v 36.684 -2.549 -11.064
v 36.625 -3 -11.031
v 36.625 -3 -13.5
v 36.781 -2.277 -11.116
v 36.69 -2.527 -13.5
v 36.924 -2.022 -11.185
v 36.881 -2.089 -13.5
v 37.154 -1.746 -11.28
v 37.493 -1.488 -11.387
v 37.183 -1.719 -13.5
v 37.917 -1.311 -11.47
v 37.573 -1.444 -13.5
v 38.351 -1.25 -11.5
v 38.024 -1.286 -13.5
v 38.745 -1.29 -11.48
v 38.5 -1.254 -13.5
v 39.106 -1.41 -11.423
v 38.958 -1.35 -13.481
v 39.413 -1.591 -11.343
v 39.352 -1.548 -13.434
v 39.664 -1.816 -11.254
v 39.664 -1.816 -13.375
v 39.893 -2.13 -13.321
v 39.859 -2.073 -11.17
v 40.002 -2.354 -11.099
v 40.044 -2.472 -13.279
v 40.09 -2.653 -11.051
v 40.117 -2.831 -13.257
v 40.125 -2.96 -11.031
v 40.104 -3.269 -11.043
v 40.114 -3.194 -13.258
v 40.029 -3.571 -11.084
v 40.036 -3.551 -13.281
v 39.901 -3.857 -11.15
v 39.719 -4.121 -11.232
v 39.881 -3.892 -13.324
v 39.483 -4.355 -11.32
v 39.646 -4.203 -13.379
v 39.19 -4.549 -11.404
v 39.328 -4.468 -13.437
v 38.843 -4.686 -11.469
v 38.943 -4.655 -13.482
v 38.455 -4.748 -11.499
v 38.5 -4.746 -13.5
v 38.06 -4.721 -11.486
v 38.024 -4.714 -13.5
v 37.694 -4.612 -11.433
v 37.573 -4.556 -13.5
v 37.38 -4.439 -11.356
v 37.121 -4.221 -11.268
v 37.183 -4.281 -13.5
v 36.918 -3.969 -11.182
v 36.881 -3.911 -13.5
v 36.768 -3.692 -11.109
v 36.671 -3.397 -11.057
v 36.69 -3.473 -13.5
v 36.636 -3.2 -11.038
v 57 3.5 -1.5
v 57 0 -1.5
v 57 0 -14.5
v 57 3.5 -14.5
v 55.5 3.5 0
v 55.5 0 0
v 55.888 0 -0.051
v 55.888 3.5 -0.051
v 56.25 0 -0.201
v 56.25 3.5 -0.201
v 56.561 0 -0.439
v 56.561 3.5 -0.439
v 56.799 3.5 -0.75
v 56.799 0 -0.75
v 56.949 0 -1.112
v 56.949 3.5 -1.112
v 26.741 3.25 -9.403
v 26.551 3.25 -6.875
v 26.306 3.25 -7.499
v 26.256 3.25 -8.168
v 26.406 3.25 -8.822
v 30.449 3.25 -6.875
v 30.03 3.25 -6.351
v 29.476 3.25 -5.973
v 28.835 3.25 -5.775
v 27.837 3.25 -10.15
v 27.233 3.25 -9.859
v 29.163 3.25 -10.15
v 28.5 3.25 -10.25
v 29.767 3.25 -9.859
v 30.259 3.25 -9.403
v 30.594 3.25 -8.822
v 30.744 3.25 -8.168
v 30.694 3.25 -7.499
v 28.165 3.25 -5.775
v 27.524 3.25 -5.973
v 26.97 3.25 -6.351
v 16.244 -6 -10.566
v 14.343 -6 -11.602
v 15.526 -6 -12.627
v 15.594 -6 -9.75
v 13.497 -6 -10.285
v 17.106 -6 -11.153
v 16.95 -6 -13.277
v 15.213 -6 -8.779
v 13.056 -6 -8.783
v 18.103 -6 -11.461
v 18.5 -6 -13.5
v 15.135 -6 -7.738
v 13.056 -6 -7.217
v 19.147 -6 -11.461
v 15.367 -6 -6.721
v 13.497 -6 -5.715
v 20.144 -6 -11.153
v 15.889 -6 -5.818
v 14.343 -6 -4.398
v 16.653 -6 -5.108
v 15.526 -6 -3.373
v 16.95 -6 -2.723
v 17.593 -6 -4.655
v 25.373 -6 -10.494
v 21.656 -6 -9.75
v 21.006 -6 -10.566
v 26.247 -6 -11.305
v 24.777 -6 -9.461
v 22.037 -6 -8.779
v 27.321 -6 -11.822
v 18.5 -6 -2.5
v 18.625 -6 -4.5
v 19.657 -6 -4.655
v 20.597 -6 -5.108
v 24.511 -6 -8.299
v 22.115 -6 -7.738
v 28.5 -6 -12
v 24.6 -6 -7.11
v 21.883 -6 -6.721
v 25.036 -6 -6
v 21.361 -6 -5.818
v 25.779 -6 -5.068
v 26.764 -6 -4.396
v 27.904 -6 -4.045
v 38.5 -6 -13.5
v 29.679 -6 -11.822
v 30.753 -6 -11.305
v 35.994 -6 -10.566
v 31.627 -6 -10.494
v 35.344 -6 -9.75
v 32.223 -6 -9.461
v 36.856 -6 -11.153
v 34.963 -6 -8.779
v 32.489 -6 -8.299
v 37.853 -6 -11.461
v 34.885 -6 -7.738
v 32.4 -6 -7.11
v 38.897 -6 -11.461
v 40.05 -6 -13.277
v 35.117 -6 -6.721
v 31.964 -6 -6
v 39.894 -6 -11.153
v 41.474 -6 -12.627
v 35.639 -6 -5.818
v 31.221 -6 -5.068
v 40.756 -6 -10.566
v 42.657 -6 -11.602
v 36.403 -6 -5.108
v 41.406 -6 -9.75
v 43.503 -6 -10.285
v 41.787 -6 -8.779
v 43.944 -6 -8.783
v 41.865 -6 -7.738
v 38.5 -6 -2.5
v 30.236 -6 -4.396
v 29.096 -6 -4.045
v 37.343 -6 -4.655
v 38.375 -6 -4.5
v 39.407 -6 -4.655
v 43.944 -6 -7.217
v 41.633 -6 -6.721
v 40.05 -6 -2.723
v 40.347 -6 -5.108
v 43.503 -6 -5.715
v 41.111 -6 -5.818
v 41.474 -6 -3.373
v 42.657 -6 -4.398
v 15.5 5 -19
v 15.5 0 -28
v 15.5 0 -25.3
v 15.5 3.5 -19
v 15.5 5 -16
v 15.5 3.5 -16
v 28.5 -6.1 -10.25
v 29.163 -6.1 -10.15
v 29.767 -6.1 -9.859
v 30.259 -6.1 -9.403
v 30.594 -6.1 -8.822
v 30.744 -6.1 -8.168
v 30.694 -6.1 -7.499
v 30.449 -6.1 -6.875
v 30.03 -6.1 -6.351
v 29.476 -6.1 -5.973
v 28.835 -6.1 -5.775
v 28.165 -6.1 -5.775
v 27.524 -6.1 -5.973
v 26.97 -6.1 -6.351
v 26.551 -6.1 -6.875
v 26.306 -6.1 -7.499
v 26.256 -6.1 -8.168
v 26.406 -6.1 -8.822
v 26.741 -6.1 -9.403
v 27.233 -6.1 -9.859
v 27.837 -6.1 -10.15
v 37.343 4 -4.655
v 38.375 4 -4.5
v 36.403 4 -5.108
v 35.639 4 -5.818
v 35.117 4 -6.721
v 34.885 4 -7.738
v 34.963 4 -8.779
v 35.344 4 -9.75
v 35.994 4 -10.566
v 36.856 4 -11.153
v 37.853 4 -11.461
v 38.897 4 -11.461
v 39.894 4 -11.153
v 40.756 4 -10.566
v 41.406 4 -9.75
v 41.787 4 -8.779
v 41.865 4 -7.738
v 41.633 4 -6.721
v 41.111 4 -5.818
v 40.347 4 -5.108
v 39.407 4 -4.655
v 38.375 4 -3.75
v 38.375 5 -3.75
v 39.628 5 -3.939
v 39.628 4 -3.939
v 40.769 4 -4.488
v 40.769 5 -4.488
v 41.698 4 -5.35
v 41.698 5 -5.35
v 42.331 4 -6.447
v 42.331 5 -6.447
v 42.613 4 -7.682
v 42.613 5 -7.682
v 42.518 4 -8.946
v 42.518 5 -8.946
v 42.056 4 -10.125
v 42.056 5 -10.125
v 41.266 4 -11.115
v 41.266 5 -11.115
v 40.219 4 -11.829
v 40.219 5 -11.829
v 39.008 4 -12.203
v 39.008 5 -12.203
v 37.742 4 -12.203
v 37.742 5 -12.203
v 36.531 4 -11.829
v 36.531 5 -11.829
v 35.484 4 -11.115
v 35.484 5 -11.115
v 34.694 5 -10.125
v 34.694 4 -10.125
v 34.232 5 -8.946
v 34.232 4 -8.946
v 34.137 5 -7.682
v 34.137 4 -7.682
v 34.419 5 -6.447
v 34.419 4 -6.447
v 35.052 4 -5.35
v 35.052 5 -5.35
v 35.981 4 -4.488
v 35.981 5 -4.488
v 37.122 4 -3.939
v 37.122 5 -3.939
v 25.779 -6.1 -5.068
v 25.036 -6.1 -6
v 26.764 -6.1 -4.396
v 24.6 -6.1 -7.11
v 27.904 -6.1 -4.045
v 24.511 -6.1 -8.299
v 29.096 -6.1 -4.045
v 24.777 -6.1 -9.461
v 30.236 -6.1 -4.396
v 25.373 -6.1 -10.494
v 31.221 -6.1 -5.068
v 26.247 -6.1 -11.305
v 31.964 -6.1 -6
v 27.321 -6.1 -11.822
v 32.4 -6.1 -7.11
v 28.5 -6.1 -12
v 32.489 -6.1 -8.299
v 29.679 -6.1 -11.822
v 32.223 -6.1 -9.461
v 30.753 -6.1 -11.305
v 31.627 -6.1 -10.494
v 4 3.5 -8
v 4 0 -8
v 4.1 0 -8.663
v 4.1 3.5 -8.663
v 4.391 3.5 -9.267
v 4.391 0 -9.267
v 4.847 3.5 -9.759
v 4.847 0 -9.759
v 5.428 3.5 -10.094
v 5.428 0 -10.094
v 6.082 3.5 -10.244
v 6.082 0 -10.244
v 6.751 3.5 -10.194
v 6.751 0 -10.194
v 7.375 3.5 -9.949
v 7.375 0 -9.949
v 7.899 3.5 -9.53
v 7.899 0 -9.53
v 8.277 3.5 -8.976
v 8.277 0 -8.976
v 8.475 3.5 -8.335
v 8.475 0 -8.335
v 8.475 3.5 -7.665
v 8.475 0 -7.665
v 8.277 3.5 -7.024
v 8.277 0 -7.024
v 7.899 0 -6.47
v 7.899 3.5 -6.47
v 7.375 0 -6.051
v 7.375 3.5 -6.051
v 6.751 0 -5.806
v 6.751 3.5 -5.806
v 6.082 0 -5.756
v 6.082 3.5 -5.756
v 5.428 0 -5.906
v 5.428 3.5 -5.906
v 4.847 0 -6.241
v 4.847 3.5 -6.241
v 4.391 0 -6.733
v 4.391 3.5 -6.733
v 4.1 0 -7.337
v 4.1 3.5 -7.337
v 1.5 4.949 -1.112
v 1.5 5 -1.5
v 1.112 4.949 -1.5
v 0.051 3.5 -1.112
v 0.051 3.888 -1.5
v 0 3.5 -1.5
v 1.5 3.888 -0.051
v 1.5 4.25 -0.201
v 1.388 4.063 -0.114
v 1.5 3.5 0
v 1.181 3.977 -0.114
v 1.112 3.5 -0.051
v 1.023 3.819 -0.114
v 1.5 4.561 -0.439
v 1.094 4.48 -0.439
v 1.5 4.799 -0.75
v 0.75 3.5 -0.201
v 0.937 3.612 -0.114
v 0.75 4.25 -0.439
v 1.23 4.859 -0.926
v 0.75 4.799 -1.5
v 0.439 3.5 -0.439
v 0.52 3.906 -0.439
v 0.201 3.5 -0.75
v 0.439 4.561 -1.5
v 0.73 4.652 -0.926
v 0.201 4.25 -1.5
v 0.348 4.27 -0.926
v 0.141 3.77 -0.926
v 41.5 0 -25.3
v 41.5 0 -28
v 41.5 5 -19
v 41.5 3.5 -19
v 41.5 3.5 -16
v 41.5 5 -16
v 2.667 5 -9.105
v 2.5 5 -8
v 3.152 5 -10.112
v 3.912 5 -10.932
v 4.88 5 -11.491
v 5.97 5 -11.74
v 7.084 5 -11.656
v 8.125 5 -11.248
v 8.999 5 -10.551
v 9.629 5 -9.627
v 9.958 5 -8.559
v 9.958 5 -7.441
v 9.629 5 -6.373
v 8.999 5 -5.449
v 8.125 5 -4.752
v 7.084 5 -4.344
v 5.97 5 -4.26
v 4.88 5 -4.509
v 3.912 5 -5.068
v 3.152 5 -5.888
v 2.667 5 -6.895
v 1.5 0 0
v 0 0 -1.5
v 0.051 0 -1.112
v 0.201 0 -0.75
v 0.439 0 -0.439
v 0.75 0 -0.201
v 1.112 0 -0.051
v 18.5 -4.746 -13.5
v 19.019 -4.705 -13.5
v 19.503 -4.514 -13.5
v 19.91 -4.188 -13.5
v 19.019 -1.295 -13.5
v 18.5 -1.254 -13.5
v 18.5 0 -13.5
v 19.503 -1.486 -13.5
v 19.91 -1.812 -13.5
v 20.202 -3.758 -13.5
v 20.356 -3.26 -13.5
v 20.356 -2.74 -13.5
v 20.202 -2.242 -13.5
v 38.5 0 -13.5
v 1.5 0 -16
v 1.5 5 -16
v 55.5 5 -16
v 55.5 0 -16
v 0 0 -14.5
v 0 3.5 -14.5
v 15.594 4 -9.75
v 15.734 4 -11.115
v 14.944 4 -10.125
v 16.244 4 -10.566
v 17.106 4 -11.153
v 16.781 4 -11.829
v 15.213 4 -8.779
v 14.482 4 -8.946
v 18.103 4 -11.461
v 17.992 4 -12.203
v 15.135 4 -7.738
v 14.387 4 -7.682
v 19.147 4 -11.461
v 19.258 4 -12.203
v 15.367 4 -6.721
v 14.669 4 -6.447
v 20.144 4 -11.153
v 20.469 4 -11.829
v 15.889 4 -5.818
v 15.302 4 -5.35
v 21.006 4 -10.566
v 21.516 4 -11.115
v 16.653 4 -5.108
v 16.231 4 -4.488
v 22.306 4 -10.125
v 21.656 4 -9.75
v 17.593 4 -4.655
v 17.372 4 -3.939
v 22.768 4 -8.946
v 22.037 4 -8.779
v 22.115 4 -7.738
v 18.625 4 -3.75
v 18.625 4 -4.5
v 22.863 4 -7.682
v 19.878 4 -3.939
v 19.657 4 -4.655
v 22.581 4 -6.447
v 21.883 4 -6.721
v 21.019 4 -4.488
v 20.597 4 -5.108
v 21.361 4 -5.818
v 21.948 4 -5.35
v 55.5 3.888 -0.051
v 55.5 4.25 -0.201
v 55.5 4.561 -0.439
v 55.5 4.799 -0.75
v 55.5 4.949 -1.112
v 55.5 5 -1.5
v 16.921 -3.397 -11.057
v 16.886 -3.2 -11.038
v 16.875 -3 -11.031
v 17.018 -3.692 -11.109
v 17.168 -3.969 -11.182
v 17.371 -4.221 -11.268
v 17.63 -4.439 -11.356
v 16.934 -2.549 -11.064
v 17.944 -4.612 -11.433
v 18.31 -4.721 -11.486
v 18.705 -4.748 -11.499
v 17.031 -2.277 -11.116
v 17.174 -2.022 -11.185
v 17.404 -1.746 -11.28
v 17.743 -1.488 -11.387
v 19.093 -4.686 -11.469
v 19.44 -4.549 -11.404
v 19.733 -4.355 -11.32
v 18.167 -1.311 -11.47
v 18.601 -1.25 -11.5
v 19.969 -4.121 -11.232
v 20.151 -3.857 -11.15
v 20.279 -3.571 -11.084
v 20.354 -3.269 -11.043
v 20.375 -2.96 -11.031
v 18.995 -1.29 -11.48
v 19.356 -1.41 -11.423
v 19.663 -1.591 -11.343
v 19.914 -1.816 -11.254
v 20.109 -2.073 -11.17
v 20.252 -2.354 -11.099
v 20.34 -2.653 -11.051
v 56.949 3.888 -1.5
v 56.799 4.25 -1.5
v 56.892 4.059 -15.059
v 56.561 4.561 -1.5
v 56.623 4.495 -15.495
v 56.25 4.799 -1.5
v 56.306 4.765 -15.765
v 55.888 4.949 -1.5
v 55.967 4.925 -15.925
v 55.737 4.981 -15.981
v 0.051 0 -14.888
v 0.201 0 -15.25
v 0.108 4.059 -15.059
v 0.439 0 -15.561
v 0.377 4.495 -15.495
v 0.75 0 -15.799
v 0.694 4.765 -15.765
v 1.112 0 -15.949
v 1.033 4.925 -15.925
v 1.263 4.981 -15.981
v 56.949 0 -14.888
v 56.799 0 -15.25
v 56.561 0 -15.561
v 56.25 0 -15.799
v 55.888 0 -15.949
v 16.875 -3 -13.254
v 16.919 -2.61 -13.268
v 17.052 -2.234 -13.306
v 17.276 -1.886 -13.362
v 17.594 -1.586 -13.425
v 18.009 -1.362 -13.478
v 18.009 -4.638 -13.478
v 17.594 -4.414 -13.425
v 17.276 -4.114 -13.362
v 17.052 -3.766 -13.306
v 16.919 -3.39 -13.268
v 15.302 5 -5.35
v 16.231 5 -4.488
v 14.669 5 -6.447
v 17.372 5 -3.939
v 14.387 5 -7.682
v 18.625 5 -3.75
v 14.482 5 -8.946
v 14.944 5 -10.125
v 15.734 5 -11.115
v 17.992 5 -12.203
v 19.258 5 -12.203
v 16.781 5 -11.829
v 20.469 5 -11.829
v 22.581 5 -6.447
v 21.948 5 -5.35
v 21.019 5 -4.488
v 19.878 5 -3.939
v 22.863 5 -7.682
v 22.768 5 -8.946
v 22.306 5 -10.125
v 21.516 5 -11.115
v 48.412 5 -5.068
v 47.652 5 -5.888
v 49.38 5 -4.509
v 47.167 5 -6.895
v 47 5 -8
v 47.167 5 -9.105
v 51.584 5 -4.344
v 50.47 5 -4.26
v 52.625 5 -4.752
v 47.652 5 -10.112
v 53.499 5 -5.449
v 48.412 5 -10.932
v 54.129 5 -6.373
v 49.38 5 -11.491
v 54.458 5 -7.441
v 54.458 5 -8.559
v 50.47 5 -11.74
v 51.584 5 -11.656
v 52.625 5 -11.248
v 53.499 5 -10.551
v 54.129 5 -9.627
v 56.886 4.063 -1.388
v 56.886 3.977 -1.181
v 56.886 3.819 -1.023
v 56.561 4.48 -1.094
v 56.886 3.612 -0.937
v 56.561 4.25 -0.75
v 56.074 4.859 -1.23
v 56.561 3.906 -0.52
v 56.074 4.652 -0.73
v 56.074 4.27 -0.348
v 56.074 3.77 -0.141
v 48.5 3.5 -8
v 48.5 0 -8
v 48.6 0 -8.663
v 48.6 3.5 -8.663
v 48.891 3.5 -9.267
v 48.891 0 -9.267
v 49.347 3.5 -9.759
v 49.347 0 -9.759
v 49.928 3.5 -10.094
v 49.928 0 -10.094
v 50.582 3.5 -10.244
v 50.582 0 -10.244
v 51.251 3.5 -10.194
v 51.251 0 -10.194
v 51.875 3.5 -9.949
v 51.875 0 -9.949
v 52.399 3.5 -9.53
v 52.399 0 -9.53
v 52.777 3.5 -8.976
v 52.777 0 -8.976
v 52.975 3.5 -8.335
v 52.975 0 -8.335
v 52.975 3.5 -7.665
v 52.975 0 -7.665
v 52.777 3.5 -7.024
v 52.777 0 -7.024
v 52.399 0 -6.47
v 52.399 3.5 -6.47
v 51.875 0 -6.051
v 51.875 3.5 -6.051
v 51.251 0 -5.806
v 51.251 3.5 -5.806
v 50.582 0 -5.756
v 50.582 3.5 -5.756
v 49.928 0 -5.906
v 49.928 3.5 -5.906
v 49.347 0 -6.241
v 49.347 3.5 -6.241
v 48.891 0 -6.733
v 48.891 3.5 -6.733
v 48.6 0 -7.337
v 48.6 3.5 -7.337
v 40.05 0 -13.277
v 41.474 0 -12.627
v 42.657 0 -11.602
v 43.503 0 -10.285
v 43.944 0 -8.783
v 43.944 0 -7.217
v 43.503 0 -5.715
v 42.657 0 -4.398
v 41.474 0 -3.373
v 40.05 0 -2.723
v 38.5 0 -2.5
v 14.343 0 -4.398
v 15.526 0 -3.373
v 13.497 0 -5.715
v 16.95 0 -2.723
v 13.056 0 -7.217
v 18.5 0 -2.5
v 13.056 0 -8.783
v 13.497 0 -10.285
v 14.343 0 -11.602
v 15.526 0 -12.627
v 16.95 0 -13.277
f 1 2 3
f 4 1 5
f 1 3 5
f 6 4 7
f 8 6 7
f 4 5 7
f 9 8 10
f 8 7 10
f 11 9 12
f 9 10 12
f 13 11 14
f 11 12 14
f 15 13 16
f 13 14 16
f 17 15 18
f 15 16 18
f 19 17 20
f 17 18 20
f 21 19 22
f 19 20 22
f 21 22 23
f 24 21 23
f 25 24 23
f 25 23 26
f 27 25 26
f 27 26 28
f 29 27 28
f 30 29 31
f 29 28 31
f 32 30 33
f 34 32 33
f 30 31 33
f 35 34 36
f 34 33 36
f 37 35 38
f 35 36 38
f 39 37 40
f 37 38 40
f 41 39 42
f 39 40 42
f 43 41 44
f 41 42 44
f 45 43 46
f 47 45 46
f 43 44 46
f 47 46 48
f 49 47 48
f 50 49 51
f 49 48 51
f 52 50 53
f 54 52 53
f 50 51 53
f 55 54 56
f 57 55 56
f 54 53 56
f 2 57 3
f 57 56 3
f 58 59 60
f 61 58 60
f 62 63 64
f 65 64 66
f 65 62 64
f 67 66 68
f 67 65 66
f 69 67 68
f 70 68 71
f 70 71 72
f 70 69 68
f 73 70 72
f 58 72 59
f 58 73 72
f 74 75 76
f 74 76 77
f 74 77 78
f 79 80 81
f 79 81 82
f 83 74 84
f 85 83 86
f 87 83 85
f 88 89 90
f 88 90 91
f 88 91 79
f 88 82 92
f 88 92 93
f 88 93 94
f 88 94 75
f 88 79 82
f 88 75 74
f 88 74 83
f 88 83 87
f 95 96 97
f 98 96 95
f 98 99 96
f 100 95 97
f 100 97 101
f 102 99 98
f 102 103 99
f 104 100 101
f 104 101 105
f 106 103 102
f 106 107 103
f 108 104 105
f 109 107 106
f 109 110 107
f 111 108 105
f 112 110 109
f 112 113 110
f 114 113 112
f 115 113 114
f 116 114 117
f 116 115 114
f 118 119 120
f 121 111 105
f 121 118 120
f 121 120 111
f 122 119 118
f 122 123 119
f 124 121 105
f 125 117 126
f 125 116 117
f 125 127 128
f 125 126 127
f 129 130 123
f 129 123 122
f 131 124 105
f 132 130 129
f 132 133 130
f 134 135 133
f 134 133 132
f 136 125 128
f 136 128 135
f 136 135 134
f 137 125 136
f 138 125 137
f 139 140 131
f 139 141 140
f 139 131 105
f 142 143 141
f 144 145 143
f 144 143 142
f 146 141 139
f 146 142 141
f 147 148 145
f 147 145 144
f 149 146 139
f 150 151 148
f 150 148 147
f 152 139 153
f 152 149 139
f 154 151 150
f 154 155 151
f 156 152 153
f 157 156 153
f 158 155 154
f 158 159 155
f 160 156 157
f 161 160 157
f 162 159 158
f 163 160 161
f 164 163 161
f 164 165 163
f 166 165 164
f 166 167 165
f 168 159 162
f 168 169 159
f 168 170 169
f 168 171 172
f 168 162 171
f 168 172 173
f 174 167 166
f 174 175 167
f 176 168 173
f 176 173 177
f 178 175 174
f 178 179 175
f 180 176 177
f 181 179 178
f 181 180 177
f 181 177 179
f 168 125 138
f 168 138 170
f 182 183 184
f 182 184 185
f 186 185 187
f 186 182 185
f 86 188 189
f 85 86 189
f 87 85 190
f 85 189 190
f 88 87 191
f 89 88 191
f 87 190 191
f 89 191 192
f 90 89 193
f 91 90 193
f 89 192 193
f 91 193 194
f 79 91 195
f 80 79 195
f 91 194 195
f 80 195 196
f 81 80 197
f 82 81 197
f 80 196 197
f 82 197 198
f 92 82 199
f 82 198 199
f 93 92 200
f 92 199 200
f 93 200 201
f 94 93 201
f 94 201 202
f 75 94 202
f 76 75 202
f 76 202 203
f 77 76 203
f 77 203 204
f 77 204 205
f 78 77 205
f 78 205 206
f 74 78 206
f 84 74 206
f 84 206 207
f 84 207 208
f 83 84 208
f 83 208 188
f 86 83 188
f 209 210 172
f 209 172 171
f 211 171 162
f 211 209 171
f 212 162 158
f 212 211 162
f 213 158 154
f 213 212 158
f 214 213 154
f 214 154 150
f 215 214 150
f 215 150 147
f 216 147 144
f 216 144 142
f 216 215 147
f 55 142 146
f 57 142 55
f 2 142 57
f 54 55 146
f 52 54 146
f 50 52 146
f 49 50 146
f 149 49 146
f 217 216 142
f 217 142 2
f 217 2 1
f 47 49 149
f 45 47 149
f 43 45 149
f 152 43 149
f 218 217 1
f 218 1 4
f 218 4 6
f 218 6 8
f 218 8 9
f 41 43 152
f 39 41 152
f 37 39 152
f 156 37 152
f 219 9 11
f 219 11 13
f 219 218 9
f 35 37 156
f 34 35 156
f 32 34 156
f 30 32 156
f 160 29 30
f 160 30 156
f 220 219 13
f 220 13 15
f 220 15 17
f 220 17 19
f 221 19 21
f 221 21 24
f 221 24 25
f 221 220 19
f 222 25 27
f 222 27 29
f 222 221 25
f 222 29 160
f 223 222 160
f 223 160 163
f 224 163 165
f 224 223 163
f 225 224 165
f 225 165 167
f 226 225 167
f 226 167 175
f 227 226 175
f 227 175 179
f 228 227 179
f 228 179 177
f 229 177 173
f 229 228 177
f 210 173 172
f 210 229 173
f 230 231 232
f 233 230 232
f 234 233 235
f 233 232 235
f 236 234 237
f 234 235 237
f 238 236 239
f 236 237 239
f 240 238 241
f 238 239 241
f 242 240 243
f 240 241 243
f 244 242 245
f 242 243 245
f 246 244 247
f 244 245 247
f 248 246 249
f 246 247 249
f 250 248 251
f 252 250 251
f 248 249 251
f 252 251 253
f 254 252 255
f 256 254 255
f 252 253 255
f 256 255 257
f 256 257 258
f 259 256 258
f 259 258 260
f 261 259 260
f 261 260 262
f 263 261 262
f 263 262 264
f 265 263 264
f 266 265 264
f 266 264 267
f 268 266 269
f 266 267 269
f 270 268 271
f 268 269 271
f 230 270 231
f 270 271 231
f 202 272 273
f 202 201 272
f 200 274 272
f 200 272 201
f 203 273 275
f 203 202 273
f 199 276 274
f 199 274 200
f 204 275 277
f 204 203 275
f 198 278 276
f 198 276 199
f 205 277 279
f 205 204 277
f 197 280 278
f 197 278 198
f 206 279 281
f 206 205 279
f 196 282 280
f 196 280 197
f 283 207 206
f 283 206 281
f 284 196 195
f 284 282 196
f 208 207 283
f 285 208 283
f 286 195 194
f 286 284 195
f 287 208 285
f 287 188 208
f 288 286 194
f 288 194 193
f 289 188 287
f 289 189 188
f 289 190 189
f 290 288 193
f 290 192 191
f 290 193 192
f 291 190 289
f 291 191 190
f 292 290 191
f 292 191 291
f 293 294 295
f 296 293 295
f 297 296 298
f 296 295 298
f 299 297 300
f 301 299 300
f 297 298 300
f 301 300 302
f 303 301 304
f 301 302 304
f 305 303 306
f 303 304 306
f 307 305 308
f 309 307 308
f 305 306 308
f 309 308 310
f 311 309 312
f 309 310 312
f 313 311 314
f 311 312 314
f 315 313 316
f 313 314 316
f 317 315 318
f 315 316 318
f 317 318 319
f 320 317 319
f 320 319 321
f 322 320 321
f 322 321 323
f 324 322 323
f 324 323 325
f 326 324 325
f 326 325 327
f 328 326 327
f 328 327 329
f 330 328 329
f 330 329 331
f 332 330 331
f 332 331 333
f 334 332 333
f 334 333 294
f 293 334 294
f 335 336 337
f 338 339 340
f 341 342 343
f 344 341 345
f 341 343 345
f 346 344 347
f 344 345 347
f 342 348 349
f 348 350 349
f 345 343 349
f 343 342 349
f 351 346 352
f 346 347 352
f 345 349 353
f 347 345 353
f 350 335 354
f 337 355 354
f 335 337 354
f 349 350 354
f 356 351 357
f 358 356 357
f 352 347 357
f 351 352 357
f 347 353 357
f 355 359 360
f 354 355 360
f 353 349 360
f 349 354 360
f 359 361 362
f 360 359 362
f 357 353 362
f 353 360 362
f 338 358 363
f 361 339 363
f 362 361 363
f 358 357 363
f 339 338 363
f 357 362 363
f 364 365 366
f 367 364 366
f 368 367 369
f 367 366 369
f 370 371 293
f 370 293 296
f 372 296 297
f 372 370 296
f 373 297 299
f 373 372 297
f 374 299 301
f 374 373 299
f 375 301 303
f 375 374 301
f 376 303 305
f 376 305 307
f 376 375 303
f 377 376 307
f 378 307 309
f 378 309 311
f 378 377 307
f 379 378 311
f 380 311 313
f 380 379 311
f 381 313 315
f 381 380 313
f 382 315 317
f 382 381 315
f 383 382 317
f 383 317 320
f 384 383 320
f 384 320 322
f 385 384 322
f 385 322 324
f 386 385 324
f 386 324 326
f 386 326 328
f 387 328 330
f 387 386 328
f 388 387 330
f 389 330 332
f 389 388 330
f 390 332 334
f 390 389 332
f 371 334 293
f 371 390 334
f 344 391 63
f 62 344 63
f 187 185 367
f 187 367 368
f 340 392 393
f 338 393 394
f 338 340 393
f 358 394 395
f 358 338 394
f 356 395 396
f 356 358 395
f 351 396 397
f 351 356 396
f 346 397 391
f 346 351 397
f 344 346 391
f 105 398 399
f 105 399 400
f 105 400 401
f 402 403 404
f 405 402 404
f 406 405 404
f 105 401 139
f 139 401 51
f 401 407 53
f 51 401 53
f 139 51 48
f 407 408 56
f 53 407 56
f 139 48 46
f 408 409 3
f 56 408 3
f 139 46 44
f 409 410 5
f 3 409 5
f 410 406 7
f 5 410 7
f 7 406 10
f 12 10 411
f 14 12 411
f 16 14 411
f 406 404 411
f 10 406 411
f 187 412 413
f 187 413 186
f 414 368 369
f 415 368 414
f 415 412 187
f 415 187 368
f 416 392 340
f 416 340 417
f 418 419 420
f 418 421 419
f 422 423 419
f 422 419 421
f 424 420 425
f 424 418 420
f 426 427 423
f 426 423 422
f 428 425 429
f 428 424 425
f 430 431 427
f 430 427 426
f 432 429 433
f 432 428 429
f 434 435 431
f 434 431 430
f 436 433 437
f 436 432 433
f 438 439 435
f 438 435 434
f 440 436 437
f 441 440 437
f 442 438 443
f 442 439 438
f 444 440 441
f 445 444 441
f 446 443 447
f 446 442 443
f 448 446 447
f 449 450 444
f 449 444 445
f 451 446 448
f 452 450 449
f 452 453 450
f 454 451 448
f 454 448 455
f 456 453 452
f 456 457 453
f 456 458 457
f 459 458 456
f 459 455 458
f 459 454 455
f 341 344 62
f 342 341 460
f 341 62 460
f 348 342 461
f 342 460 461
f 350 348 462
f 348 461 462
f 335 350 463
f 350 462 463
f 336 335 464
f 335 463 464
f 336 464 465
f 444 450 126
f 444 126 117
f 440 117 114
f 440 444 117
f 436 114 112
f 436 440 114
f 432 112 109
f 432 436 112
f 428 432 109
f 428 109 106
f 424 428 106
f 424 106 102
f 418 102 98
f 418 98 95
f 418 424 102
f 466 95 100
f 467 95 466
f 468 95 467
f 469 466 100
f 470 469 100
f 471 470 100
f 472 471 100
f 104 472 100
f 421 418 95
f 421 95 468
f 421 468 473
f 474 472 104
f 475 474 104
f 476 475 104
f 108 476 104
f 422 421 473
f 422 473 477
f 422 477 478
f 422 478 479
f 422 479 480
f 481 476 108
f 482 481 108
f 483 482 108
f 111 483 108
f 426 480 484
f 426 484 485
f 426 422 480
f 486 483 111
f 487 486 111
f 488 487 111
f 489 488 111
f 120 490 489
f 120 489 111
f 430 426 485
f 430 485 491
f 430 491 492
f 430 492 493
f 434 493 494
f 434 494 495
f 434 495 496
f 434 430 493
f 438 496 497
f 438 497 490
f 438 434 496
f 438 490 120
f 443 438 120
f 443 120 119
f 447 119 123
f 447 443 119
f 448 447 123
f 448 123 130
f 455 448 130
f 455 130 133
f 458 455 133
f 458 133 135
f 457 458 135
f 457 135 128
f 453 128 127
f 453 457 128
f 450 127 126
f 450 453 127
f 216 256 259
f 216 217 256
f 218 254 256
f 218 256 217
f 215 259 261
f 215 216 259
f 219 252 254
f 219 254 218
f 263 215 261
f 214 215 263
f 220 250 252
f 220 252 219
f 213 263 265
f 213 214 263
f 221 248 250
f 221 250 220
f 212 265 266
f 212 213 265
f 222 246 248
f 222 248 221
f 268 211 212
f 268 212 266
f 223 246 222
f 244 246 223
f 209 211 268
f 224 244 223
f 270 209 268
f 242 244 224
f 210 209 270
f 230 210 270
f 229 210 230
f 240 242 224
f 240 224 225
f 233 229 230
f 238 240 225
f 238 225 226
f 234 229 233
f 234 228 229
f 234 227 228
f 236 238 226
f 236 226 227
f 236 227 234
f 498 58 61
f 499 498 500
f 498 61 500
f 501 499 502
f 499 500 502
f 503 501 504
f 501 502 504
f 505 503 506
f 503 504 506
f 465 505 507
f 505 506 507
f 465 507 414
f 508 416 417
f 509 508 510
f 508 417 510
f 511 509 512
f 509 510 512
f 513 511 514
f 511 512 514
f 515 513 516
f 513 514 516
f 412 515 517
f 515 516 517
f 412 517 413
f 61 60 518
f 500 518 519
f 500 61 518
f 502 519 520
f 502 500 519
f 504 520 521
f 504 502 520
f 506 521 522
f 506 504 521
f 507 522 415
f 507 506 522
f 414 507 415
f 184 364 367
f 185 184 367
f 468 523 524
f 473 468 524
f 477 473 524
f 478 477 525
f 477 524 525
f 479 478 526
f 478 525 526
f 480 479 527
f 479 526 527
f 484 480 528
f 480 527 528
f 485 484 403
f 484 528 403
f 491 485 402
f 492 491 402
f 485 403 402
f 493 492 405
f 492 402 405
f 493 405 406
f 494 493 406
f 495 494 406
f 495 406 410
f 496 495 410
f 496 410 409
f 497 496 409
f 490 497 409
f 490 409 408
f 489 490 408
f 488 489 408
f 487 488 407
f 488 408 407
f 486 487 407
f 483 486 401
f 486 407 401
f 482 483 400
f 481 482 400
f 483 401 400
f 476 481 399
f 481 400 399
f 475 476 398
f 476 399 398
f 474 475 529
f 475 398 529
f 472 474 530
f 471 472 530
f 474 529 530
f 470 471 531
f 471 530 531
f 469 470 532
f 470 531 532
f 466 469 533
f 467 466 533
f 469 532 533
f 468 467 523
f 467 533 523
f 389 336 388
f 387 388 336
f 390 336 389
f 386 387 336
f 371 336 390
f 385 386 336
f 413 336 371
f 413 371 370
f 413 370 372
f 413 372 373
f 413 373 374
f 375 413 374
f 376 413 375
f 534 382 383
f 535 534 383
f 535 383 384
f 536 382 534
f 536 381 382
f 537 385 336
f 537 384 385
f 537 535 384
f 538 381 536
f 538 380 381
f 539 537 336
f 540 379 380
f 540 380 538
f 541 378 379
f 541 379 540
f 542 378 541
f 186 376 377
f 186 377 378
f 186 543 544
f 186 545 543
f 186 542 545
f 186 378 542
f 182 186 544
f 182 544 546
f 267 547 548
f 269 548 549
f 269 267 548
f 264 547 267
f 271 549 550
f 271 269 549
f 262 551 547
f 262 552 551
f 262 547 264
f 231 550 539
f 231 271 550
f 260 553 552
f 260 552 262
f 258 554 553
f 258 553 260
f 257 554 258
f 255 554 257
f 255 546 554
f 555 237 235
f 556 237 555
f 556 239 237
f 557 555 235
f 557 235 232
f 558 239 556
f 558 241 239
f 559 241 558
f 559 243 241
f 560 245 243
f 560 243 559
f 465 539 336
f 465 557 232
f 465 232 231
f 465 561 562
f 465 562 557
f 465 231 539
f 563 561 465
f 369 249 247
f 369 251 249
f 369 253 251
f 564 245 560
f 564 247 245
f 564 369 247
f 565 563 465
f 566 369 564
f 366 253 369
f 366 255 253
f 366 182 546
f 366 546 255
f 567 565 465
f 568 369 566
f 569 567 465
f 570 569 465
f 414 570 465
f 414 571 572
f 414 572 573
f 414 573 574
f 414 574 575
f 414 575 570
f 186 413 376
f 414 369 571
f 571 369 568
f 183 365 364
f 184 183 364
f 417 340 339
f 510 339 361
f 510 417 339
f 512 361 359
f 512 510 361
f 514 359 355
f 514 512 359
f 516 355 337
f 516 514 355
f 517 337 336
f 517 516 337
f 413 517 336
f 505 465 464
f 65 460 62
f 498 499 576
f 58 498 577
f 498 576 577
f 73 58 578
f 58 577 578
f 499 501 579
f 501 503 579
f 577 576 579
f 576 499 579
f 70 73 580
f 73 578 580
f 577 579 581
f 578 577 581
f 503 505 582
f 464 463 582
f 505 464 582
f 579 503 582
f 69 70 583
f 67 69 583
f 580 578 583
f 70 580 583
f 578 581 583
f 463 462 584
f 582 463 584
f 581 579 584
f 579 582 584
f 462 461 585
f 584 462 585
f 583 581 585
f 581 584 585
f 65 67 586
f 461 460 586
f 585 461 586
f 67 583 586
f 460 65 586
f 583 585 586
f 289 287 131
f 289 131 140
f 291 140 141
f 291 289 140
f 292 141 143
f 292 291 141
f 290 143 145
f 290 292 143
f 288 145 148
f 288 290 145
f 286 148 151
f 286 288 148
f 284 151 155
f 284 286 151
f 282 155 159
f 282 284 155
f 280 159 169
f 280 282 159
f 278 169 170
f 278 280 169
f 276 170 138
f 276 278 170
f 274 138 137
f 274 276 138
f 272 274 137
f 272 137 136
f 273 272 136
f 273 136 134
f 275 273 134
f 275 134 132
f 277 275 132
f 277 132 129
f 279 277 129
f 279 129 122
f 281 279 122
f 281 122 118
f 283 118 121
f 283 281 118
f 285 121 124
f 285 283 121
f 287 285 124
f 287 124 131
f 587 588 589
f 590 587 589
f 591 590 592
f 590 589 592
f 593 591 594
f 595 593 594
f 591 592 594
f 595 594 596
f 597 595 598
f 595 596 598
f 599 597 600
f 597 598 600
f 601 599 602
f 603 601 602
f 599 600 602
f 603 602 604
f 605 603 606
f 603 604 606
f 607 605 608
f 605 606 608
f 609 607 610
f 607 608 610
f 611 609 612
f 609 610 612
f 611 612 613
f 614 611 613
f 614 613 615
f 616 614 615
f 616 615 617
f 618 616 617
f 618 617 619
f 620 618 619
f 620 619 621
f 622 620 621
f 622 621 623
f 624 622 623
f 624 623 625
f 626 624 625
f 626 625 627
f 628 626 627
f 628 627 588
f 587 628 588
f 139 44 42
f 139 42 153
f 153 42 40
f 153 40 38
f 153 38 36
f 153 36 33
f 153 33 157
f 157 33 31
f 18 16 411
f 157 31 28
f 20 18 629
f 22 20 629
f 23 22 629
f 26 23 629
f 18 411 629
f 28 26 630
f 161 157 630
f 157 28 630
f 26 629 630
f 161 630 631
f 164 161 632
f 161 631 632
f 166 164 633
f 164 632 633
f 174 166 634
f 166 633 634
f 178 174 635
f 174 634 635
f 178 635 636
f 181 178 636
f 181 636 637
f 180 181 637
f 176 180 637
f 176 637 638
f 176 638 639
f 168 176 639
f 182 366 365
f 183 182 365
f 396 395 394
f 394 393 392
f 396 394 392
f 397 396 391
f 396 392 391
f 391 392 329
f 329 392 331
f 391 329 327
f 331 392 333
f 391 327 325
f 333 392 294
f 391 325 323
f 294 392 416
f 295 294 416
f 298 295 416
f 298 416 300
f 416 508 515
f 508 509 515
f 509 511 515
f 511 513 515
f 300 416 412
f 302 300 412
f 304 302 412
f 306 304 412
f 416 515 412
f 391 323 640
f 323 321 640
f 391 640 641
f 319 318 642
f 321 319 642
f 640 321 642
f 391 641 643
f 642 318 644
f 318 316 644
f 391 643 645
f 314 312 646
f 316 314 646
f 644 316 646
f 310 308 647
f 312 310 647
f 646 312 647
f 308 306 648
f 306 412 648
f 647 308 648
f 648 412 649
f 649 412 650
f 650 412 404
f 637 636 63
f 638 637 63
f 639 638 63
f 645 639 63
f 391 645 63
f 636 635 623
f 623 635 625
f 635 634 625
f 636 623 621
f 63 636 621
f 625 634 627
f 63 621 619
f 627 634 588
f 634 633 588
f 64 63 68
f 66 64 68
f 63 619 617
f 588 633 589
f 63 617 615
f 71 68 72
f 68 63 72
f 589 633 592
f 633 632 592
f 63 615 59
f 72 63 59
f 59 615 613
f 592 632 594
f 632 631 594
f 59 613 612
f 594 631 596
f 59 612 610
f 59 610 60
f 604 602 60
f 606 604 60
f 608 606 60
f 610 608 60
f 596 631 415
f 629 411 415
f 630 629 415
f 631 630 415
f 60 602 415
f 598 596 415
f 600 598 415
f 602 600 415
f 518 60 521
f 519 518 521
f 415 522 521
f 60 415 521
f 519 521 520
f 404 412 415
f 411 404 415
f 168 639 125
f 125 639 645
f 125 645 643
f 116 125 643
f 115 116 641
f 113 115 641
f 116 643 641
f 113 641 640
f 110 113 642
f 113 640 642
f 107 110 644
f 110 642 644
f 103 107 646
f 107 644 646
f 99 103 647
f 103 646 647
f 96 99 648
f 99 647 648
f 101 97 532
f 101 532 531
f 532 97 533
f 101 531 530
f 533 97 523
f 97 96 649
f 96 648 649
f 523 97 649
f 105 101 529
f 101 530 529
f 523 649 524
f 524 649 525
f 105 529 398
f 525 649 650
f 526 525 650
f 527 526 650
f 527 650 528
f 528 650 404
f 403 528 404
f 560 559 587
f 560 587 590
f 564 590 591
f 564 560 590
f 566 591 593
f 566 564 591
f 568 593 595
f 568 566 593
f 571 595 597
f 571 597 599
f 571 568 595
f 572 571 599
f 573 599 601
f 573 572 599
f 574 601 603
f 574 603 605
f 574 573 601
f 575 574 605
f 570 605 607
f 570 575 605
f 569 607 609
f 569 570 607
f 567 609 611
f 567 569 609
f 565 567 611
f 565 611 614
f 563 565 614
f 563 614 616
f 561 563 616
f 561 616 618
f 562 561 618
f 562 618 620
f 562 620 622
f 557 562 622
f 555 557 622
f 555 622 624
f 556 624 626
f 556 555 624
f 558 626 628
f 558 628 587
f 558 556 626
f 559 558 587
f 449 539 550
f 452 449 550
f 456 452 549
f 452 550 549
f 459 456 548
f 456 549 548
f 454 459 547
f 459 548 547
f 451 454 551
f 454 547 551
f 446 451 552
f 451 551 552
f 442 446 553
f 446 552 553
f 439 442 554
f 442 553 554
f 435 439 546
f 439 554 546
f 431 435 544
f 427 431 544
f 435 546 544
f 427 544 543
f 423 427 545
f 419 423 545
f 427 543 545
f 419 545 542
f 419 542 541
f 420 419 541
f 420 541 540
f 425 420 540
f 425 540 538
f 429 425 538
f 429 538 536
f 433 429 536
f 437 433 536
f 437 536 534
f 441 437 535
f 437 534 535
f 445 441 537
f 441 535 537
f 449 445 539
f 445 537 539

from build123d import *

# Parameters (mm, degrees)
SKETCH_1_W           = 57
SKETCH_1_H           = 16
EXTRUDE_1_DEPTH      = 5
FILLET_1_R           = 1.5
HOLE_WIZARD_M41_D    = 4.5
CHAMFER_1_SIZE       = 1.5
SKETCH_2_R           = 4.25
CUT_EXTRUDE_1_DEPTH  = 1
SKETCH_7_R           = 3.5
CUT_EXTRUDE_2_DEPTH  = 60.338014797
EXTRUDE_2_DEPTH      = 13
EXTRUDE_2_DEPTH_BACK = 13
SKETCH_10_R          = 3.5
EXTRUDE_3_DEPTH      = 6
SKETCH_11_R          = 2.25
CUT_EXTRUDE_3_DEPTH  = 9.25
EXTRUDE_START        = 0.1
SKETCH_12_R          = 4
SKETCH_12_R_2        = 2.25
EXTRUDE_4_DEPTH      = 0.1
SKETCH_13_R          = 1.75
CUT_EXTRUDE_4_DEPTH  = 5


with BuildPart() as part:
    # Sketch 1 → Extrude 1 (new body)
    with BuildSketch(Plane(origin=(0, 0, 0), x_dir=(1, 0, 0), z_dir=(0, 1, 0))):
        with Locations((28.5, 8)):
            Rectangle(SKETCH_1_W, SKETCH_1_H)
    extrude(amount=EXTRUDE_1_DEPTH)

    # Fillet 1
    fillet_1_edges = [part.edges().sort_by_distance(p)[0] for p in [
        (0, 5, -8),
        (28.5, 5, 0),
        (57, 5, -8),
        (0, 2.5, 0),
        (0, 2.5, -16),
        (57, 2.5, -16),
        (57, 2.5, 0),
    ]]
    fillet(fillet_1_edges, radius=FILLET_1_R)

    # Hole Wizard M41 (through all)
    with Locations(Plane(origin=(0, 5, 0), x_dir=(1, 0, 0), z_dir=(0, 1, 0))):
        with Locations((6.25, 8), (50.75, 8)):
            Hole(HOLE_WIZARD_M41_D / 2)

    # Chamfer 1
    chamfer_1_edges = [part.edges().sort_by_distance(p)[0] for p in [
        (53, 5, -8),
        (8.5, 5, -8),
    ]]
    chamfer(chamfer_1_edges, length=CHAMFER_1_SIZE)

    # Sketch 2 → Cut-Extrude 1 (cut)
    with BuildSketch(Plane(origin=(0, 5, 0), x_dir=(1, 0, 0), z_dir=(0, 1, 0))):
        with Locations(Location((18.625, 8, 0), (0, 0, 270))):
            Circle(SKETCH_2_R)
        with Locations(Location((38.375, 8, 0), (0, 0, 270))):
            Circle(SKETCH_2_R)
    extrude(amount=-CUT_EXTRUDE_1_DEPTH, mode=Mode.SUBTRACT)

    # Sketch 7 → Cut-Extrude 2 (cut, through all)
    with BuildSketch(Plane(origin=(0, 4, 0), x_dir=(1, 0, 0), z_dir=(0, 1, 0))):
        with Locations(Location((18.625, 8, 0), (0, 0, 270))):
            Circle(SKETCH_7_R)
        with Locations(Location((38.375, 8, 0), (0, 0, 270))):
            Circle(SKETCH_7_R)
    extrude(amount=-CUT_EXTRUDE_2_DEPTH, mode=Mode.SUBTRACT)

    # Sketch 9 → Extrude 2 (add, two sides: drawn at the far end of the back side and taken through both)
    with BuildSketch(Plane.ZY.offset(-28.5).offset(-EXTRUDE_2_DEPTH_BACK)):
        Polygon((-19, 5), (-28, 0), (-25.3, 0), (-19, 3.5), (-16, 3.5), (-16, 5), align=None)
    extrude(amount=EXTRUDE_2_DEPTH + EXTRUDE_2_DEPTH_BACK)

    # Sketch 10 → Extrude 3 (add)
    with BuildSketch(Plane.XZ):
        with BuildLine():
            Line((18.5, -13.5), (38.5, -13.5))
            ThreePointArc((38.5, -13.5), (44, -8), (38.5, -2.5))
            Line((38.5, -2.5), (18.5, -2.5))
            ThreePointArc((18.5, -2.5), (13, -8), (18.5, -13.5))
        make_face()
        with Locations(Location((38.375, -8, 0), (0, 0, 90))):
            Circle(SKETCH_10_R, mode=Mode.SUBTRACT)
        with Locations(Location((18.625, -8, 0), (0, 0, 90))):
            Circle(SKETCH_10_R, mode=Mode.SUBTRACT)
    extrude(amount=EXTRUDE_3_DEPTH)

    # Sketch 11 → Cut-Extrude 3 (cut)
    with BuildSketch(Plane.XZ.offset(6)):
        with Locations(Location((28.5, -8, 0), (0, 0, 270))):
            Circle(SKETCH_11_R)
    extrude(amount=-CUT_EXTRUDE_3_DEPTH, mode=Mode.SUBTRACT)

    # Sketch 12 → Extrude 4 (add)
    with BuildSketch(Plane.XZ.offset(6).offset(EXTRUDE_START)):
        with Locations(Location((28.5, -8, 0), (0, 0, 270))):
            Circle(SKETCH_12_R)
        with Locations(Location((28.5, -8, 0), (0, 0, 270))):
            Circle(SKETCH_12_R_2, mode=Mode.SUBTRACT)
    extrude(amount=-EXTRUDE_4_DEPTH)

    # Sketch 13 → Cut-Extrude 4 (cut)
    with BuildSketch(Plane(origin=(0, 0, -13.5), x_dir=(-1, 0, 0), z_dir=(0, 0, -1))):
        with Locations((-38.375, -3)):
            Circle(SKETCH_13_R)
        with Locations((-18.625, -3)):
            Circle(SKETCH_13_R)
    extrude(amount=-CUT_EXTRUDE_4_DEPTH, mode=Mode.SUBTRACT)


solid = part.part
